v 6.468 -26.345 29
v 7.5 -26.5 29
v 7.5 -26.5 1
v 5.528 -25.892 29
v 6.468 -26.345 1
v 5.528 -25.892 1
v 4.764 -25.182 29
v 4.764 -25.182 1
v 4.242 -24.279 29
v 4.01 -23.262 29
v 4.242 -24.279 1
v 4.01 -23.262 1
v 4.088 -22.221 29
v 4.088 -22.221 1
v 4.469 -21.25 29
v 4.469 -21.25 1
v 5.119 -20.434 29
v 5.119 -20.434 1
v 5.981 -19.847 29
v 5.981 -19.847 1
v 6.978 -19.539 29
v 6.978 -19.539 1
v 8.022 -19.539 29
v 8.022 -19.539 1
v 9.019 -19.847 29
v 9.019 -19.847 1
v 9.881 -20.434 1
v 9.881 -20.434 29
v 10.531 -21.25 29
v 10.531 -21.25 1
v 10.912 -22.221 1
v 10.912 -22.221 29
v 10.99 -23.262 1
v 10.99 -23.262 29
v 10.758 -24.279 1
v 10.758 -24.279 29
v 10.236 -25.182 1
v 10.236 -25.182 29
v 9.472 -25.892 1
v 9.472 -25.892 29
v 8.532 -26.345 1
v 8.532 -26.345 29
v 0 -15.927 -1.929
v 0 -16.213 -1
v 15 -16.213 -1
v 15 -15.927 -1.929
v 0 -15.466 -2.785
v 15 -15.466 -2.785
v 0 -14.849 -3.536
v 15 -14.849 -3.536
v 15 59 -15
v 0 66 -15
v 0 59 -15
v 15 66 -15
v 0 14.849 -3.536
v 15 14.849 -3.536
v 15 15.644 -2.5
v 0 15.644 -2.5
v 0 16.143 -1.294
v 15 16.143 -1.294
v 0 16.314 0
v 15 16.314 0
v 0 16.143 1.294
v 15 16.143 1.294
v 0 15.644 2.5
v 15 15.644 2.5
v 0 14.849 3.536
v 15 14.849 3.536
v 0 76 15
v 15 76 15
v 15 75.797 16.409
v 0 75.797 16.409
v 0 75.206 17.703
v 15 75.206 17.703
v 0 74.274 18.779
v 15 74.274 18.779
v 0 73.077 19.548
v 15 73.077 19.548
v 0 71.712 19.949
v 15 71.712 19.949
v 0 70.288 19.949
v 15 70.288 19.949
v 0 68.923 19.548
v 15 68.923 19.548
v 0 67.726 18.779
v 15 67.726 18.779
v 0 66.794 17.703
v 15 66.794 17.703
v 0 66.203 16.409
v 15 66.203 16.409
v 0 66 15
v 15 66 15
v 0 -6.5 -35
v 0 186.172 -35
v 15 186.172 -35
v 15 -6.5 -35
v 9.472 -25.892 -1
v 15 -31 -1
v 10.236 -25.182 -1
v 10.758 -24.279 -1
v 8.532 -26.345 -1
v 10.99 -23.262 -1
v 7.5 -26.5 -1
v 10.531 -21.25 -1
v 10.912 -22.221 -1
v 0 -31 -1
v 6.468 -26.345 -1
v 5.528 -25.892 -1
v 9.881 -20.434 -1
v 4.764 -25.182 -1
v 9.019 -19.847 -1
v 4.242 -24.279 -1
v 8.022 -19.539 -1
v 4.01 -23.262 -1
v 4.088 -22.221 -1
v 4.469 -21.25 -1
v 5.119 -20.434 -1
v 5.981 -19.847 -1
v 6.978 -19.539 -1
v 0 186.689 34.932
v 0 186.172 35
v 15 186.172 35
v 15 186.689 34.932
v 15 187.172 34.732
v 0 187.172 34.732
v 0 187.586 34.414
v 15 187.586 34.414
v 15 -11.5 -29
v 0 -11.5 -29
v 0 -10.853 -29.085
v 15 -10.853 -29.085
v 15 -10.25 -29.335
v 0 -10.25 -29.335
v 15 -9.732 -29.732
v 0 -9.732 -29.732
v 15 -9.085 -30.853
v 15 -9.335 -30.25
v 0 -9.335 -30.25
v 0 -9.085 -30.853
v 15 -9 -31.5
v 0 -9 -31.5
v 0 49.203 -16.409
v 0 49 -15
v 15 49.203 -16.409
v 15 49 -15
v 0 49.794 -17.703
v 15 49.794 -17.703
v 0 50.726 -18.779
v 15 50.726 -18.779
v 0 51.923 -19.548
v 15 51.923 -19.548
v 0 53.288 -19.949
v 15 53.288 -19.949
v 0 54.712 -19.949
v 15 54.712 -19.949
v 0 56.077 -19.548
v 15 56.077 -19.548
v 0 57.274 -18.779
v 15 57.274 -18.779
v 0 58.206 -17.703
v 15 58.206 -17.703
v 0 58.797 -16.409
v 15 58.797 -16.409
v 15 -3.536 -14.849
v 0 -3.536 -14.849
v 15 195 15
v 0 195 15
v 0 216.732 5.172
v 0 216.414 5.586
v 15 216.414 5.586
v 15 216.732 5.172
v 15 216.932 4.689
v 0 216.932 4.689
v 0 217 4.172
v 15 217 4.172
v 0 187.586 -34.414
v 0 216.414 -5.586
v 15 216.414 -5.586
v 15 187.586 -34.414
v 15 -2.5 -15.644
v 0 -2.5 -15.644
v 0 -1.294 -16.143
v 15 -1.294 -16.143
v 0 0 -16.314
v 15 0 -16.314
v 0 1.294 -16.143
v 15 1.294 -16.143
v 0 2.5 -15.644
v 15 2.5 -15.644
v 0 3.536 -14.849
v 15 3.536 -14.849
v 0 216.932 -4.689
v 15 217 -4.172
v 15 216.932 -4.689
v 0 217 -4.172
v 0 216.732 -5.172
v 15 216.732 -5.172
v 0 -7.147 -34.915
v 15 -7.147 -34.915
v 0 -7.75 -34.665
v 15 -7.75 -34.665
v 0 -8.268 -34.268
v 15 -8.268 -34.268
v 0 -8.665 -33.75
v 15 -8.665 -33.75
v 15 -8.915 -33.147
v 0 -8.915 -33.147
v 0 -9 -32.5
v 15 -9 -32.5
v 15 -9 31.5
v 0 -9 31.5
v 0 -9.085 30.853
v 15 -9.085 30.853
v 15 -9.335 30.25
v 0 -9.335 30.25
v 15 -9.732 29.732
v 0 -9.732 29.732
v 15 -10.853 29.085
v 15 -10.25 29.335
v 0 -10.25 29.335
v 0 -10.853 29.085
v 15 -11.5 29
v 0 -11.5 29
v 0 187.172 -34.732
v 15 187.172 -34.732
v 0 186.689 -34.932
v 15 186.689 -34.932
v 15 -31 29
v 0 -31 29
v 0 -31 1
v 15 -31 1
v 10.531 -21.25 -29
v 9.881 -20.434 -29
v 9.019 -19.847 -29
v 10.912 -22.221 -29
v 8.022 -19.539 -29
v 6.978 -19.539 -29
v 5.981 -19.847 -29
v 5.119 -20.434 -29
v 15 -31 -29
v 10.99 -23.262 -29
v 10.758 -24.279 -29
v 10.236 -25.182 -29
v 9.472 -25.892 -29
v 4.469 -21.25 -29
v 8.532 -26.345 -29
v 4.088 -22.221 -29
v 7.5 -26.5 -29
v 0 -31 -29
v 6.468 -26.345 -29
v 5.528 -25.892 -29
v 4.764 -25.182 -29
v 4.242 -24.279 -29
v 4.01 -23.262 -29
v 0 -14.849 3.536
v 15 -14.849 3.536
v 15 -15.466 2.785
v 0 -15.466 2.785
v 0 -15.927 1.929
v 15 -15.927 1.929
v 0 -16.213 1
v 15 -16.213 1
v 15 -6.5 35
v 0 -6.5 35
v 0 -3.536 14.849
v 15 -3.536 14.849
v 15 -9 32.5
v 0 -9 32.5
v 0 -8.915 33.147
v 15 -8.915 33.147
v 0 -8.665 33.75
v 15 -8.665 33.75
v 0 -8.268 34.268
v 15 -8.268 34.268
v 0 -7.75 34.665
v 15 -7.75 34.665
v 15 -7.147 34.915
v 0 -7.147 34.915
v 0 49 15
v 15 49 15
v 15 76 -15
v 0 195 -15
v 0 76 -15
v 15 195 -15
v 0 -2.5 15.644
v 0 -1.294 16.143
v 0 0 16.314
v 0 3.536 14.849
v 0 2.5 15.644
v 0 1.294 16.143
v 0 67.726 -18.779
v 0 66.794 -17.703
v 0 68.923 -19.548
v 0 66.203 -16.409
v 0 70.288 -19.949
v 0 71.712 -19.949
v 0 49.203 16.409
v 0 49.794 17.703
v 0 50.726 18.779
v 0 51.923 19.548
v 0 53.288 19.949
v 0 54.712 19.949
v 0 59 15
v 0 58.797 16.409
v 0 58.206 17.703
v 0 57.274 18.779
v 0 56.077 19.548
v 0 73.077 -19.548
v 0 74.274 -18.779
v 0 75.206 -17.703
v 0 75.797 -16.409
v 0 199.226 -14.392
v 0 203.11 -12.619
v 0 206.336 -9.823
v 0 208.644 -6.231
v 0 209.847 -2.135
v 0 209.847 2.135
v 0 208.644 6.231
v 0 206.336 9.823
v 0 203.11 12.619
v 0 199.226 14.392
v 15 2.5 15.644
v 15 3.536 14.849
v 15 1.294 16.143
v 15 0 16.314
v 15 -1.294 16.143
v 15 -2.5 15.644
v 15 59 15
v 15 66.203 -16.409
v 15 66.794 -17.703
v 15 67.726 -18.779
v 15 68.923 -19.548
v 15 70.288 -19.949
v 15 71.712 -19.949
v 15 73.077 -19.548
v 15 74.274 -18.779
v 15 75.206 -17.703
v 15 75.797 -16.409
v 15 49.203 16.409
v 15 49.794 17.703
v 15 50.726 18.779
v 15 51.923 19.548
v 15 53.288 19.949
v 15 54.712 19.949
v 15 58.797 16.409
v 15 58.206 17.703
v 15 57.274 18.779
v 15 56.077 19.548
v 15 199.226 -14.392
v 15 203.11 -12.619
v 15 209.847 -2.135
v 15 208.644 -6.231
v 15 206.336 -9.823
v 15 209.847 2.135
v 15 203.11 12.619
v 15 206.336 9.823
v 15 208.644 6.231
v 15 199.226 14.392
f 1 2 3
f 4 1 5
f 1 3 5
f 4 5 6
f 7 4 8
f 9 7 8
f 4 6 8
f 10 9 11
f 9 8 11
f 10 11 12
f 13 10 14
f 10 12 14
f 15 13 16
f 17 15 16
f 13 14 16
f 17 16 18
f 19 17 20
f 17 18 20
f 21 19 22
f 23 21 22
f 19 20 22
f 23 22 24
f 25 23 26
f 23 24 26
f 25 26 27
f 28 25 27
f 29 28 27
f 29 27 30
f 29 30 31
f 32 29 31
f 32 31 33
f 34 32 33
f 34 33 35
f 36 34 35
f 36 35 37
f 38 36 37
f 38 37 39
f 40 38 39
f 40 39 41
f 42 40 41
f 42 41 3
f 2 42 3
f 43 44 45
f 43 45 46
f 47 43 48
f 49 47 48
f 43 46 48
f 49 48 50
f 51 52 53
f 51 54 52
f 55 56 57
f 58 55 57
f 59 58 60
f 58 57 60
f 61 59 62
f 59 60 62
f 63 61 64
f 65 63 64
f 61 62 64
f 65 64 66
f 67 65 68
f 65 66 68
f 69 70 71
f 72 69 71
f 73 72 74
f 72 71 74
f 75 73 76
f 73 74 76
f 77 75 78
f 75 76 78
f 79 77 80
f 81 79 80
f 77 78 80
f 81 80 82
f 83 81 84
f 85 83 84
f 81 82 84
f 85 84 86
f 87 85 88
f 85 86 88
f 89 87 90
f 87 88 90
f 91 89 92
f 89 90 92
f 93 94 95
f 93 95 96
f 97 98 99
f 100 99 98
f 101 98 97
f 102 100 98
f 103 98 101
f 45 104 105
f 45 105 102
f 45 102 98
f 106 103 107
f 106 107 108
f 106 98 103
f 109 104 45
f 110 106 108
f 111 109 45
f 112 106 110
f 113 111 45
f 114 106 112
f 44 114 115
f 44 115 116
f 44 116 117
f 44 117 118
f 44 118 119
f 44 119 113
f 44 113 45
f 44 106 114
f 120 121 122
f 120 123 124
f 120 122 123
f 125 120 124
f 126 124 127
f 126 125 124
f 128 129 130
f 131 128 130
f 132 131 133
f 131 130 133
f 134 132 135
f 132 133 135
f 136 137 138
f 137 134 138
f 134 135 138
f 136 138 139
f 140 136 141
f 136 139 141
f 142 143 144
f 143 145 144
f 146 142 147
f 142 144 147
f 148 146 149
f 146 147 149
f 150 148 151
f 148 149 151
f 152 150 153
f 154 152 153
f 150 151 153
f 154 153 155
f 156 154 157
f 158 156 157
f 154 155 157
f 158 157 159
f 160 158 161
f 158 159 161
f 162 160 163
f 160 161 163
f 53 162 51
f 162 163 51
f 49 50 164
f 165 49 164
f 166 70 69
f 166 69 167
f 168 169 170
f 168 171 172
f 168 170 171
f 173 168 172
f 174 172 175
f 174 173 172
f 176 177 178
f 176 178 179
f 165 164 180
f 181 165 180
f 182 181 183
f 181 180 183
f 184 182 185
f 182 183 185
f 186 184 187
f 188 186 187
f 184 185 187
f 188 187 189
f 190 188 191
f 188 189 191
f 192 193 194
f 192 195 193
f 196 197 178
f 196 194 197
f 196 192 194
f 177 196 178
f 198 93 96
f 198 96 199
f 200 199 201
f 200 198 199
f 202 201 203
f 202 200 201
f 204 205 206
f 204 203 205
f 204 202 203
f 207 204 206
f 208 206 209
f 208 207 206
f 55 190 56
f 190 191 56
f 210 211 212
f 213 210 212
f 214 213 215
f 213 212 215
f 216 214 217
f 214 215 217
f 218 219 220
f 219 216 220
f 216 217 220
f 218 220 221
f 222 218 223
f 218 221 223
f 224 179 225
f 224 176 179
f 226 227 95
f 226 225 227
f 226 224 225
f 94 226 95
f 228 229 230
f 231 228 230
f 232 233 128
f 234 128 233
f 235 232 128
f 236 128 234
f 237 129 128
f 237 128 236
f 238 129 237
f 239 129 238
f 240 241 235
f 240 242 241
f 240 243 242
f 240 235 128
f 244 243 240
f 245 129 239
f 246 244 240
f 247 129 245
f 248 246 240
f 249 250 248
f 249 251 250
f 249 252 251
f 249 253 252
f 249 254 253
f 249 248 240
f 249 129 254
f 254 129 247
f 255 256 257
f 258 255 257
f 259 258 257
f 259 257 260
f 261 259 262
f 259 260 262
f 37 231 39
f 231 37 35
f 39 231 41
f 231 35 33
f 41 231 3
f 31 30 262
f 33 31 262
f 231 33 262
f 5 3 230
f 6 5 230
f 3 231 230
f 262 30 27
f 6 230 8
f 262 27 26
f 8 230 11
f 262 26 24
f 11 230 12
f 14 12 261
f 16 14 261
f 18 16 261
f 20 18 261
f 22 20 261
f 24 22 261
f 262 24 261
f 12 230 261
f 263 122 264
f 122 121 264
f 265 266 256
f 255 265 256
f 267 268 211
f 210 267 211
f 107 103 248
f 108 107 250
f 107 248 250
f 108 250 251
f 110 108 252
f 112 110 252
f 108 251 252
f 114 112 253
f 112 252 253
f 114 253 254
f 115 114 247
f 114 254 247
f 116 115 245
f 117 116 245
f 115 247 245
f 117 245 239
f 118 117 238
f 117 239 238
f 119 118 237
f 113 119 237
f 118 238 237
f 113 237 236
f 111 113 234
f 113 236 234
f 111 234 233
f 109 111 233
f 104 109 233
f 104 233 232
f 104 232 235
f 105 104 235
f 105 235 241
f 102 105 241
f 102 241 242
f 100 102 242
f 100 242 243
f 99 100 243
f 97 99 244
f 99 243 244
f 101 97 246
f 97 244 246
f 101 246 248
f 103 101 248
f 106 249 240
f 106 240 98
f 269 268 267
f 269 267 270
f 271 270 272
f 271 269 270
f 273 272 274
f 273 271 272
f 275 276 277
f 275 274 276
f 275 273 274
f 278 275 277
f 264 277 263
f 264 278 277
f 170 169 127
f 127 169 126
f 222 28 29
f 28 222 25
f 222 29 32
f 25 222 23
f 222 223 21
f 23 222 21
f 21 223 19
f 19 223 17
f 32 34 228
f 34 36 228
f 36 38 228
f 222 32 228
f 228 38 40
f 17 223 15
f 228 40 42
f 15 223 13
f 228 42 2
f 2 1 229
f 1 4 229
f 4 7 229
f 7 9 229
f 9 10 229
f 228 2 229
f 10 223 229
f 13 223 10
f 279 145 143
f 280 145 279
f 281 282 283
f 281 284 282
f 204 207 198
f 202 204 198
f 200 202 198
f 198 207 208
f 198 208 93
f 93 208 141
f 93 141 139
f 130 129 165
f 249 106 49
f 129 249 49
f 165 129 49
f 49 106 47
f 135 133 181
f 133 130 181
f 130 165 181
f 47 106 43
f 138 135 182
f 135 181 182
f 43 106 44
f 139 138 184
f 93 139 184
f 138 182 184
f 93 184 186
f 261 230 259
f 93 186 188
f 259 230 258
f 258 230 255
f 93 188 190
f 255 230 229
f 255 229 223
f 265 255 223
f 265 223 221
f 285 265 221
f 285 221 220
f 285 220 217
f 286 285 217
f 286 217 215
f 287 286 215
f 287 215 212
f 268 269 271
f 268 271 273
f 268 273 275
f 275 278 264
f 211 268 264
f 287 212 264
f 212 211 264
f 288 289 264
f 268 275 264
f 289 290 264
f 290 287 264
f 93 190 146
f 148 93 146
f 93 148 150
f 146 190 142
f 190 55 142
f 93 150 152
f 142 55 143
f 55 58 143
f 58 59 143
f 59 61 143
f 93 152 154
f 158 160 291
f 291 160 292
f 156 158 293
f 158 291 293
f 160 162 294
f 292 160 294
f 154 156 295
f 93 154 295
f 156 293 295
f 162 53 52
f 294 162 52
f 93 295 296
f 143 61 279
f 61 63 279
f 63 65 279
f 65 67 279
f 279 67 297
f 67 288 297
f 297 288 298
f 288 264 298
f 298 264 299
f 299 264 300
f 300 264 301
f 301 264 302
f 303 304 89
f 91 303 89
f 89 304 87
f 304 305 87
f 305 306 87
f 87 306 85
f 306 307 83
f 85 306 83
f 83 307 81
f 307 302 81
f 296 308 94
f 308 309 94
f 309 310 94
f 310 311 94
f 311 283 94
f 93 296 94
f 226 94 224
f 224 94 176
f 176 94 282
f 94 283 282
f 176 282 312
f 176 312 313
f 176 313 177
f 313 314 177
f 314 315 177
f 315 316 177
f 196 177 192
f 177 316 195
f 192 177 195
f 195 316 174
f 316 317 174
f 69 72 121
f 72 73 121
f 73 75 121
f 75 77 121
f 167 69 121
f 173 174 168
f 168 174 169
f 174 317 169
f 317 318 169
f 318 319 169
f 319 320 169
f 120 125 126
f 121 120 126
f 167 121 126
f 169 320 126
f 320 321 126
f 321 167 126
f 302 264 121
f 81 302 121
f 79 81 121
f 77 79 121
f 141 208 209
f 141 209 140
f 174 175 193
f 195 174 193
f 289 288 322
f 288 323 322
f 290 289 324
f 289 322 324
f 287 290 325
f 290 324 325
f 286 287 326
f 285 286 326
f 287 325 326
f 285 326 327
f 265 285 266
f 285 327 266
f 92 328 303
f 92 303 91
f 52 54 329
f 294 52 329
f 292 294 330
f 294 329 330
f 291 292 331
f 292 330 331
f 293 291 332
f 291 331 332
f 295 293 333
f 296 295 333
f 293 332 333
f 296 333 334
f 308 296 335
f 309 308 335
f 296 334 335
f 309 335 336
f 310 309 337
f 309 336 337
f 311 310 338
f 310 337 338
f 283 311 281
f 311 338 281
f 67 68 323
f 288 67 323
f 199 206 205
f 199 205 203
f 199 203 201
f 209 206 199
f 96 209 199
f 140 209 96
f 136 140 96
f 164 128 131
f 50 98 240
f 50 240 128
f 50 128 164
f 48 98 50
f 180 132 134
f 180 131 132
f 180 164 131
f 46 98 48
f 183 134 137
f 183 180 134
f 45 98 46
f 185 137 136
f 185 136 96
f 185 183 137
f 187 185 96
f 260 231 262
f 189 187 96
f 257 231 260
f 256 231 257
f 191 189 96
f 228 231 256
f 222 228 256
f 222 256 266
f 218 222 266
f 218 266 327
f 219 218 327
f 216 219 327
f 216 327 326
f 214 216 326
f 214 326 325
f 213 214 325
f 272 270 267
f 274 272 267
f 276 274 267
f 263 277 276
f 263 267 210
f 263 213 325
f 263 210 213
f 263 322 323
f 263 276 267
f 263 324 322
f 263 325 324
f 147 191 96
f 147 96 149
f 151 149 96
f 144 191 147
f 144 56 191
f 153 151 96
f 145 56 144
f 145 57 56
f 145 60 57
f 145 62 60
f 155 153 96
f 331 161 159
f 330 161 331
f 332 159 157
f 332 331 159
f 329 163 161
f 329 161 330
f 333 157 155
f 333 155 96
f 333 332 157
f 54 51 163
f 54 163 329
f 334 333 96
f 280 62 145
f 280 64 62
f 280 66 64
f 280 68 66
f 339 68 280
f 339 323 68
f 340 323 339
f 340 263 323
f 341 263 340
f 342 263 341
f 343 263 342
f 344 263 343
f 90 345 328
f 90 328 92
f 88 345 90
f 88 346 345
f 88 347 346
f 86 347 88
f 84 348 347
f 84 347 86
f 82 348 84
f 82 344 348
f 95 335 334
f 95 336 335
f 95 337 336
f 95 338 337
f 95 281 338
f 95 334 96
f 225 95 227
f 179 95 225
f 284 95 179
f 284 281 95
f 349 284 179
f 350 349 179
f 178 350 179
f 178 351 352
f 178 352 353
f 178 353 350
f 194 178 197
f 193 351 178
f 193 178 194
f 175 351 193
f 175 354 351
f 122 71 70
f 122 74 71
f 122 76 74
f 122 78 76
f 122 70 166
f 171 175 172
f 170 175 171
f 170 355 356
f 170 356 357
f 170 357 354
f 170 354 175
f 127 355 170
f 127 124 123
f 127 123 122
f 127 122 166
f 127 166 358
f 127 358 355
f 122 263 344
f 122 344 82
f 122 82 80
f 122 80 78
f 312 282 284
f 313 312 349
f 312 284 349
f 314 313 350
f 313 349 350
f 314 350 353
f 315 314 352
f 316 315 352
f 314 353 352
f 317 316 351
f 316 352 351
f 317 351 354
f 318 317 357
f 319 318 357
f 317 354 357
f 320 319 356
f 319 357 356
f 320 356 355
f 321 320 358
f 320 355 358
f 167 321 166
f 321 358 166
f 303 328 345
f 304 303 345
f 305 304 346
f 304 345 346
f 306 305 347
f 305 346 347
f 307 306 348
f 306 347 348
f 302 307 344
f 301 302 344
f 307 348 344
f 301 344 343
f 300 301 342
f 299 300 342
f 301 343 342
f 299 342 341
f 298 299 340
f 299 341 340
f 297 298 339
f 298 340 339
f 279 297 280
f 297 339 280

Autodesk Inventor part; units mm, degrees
ref_plane "YZ Plane" through (0, 0, 0) normal (1, 0, 0) x (0, 1, 0)
ref_plane "XZ Plane" through (0, 0, 0) normal (0, 1, 0) x (-1, 0, 0)
ref_plane "XY Plane" through (0, 0, 0) normal (0, 0, 1) x (1, 0, 0)
sketch "Esquisse1" plane through (0, 0, 0) normal (1, 0, 0) x (0, 1, 0)
  line L0 (0, 0) -> (122.5, 0)
  line L1 (217, 0) -> (217, 4.1716)
  line L2 (216.4142, 5.5858) -> (187.5858, 34.4142)
  line L3 (186.1716, 35) -> (-6.5, 35)
  line L4 (-9, 32.5) -> (-9, 31.5)
  line L5 (-11.5, 29) -> (-31, 29)
  line L6 (-31, 29) -> (-31, 1)
  line L7 (-31, 1) -> (0, 1)
  line L8 (0, 1) -> (0, 0)
  arc A0 (217, 4.1716) -> (216.4142, 5.5858) centre (215, 4.1716) ccw
  arc A1 (187.5858, 34.4142) -> (186.1716, 35) centre (186.1716, 33) ccw
  arc A2 (-6.5, 35) -> (-9, 32.5) centre (-6.5, 32.5) ccw
  arc A3 (-11.5, 29) -> (-9, 31.5) centre (-11.5, 31.5) ccw
  line L9 (217, 0) -> (217, -4.1716)
  line L10 (216.4142, -5.5858) -> (187.5858, -34.4142)
  line L11 (186.1716, -35) -> (-6.5, -35)
  line L12 (-9, -32.5) -> (-9, -31.5)
  line L13 (-11.5, -29) -> (-31, -29)
  line L14 (-31, -29) -> (-31, -1)
  line L15 (-31, -1) -> (0, -1)
  line L16 (0, -1) -> (0, 0)
  arc A4 (216.4142, -5.5858) -> (217, -4.1716) centre (215, -4.1716) ccw
  arc A5 (186.1716, -35) -> (187.5858, -34.4142) centre (186.1716, -33) ccw
  arc A6 (-9, -32.5) -> (-6.5, -35) centre (-6.5, -32.5) ccw
  arc A7 (-9, -31.5) -> (-11.5, -29) centre (-11.5, -31.5) ccw
  point P0 (217, 5)
  point P1 (217, -5)
  dimension "d0" = 70
  dimension "d1" = 10
  dimension "d2" = 45
  dimension "d3" = 31
  dimension "d4" = 22
  dimension "d5" = 217
  dimension "d6" = 58
  dimension "d7" = 2
  dimension "d8" = 2
  dimension "d9" = 2.5
extrude "Extrusion1" add sketch "Esquisse1" along normal blind 15
sketch "Esquisse2" plane through (15, 0, 0) normal (1, 0, 0) x (0, 0, -1)
  line L0 (0, 210) -> (0, 210)
  line L1 (15, 49) -> (-15, 49)
  line L2 (4.1716, 217) -> (-4.1716, 217) projected
  arc A0 (0, 210) -> (-15, 195) centre (0, 195) ccw
  arc A1 (15, 195) -> (0, 210) centre (0, 195) ccw
  line L3 (1, -31) -> (29, -31) projected
  line L4 (-3.5355, 14.8492) -> (-14.8492, 3.5355)
  line L5 (-14.8492, -3.5355) -> (-3.5355, -14.8492)
  line L6 (3.5355, -14.8492) -> (14.8492, -3.5355)
  line L7 (14.8492, 3.5355) -> (3.5355, 14.8492)
  arc A2 (3.5355, 14.8492) -> (-3.5355, 14.8492) centre (0, 11.3137) ccw
  arc A3 (14.8492, -3.5355) -> (14.8492, 3.5355) centre (11.3137, 0) ccw
  arc A4 (-3.5355, -14.8492) -> (3.5355, -14.8492) centre (0, -11.3137) ccw
  arc A5 (-14.8492, 3.5355) -> (-14.8492, -3.5355) centre (-11.3137, 0) ccw
  line L8 (-35, 186.1716) -> (-35, -6.5) projected
  line L9 (-1, 0) -> (1, 0) projected
  arc A6 (15, 49) -> (15, 59) centre (15, 54) ccw
  arc A7 (-15, 59) -> (-15, 49) centre (-15, 54) ccw
  arc A8 (-15, 76) -> (-15, 66) centre (-15, 71) ccw
  line L10 (-15, 59) -> (-15, 66)
  line L11 (-15, 76) -> (-15, 195)
  arc A9 (15, 66) -> (15, 76) centre (15, 71) ccw
  line L12 (15, 195) -> (15, 76)
  line L13 (15, 66) -> (15, 59)
  point P0 (0, 0)
  point P1 (-15, 210)
  point P2 (15, 210)
  point P3 (0, 18.3848)
  point P4 (-18.3848, 0)
  point P5 (18.3848, 0)
  point P6 (0, 0)
  point P7 (0, 0)
  dimension "d12" = 30
  dimension "d14" = 7
  dimension "d15" = 15
  dimension "d16" = 80
  dimension "d17" = 26
  dimension "d18" = 26
  dimension "d19" = 5
  dimension "d20" = 45
  dimension "d21" = 10
  dimension "d22" = 10
  dimension "d23" = 10
  dimension "d24" = 12
  dimension "d25" = 10
  dimension "d26" = 30
  dimension "d27" = 15
extrude "Extrusion2" cut sketch "Esquisse2" against normal through all
sketch "Esquisse3" plane through (0, -31, 29) normal (0, 0, 1) x (1, 0, 0)
  line L0 (0, 0) -> (0, 19.5) projected
  line L1 (0, 0) -> (15, 0) projected
  point P0 (0, 31)
  point P1 (7.5, 8)
  dimension "d30" = 7.5
  dimension "d31" = 8
hole "Perçage1" at (7.5, -23, 29) direction (0, 0, -1) diameter 7 end through all
properties part number "came"
